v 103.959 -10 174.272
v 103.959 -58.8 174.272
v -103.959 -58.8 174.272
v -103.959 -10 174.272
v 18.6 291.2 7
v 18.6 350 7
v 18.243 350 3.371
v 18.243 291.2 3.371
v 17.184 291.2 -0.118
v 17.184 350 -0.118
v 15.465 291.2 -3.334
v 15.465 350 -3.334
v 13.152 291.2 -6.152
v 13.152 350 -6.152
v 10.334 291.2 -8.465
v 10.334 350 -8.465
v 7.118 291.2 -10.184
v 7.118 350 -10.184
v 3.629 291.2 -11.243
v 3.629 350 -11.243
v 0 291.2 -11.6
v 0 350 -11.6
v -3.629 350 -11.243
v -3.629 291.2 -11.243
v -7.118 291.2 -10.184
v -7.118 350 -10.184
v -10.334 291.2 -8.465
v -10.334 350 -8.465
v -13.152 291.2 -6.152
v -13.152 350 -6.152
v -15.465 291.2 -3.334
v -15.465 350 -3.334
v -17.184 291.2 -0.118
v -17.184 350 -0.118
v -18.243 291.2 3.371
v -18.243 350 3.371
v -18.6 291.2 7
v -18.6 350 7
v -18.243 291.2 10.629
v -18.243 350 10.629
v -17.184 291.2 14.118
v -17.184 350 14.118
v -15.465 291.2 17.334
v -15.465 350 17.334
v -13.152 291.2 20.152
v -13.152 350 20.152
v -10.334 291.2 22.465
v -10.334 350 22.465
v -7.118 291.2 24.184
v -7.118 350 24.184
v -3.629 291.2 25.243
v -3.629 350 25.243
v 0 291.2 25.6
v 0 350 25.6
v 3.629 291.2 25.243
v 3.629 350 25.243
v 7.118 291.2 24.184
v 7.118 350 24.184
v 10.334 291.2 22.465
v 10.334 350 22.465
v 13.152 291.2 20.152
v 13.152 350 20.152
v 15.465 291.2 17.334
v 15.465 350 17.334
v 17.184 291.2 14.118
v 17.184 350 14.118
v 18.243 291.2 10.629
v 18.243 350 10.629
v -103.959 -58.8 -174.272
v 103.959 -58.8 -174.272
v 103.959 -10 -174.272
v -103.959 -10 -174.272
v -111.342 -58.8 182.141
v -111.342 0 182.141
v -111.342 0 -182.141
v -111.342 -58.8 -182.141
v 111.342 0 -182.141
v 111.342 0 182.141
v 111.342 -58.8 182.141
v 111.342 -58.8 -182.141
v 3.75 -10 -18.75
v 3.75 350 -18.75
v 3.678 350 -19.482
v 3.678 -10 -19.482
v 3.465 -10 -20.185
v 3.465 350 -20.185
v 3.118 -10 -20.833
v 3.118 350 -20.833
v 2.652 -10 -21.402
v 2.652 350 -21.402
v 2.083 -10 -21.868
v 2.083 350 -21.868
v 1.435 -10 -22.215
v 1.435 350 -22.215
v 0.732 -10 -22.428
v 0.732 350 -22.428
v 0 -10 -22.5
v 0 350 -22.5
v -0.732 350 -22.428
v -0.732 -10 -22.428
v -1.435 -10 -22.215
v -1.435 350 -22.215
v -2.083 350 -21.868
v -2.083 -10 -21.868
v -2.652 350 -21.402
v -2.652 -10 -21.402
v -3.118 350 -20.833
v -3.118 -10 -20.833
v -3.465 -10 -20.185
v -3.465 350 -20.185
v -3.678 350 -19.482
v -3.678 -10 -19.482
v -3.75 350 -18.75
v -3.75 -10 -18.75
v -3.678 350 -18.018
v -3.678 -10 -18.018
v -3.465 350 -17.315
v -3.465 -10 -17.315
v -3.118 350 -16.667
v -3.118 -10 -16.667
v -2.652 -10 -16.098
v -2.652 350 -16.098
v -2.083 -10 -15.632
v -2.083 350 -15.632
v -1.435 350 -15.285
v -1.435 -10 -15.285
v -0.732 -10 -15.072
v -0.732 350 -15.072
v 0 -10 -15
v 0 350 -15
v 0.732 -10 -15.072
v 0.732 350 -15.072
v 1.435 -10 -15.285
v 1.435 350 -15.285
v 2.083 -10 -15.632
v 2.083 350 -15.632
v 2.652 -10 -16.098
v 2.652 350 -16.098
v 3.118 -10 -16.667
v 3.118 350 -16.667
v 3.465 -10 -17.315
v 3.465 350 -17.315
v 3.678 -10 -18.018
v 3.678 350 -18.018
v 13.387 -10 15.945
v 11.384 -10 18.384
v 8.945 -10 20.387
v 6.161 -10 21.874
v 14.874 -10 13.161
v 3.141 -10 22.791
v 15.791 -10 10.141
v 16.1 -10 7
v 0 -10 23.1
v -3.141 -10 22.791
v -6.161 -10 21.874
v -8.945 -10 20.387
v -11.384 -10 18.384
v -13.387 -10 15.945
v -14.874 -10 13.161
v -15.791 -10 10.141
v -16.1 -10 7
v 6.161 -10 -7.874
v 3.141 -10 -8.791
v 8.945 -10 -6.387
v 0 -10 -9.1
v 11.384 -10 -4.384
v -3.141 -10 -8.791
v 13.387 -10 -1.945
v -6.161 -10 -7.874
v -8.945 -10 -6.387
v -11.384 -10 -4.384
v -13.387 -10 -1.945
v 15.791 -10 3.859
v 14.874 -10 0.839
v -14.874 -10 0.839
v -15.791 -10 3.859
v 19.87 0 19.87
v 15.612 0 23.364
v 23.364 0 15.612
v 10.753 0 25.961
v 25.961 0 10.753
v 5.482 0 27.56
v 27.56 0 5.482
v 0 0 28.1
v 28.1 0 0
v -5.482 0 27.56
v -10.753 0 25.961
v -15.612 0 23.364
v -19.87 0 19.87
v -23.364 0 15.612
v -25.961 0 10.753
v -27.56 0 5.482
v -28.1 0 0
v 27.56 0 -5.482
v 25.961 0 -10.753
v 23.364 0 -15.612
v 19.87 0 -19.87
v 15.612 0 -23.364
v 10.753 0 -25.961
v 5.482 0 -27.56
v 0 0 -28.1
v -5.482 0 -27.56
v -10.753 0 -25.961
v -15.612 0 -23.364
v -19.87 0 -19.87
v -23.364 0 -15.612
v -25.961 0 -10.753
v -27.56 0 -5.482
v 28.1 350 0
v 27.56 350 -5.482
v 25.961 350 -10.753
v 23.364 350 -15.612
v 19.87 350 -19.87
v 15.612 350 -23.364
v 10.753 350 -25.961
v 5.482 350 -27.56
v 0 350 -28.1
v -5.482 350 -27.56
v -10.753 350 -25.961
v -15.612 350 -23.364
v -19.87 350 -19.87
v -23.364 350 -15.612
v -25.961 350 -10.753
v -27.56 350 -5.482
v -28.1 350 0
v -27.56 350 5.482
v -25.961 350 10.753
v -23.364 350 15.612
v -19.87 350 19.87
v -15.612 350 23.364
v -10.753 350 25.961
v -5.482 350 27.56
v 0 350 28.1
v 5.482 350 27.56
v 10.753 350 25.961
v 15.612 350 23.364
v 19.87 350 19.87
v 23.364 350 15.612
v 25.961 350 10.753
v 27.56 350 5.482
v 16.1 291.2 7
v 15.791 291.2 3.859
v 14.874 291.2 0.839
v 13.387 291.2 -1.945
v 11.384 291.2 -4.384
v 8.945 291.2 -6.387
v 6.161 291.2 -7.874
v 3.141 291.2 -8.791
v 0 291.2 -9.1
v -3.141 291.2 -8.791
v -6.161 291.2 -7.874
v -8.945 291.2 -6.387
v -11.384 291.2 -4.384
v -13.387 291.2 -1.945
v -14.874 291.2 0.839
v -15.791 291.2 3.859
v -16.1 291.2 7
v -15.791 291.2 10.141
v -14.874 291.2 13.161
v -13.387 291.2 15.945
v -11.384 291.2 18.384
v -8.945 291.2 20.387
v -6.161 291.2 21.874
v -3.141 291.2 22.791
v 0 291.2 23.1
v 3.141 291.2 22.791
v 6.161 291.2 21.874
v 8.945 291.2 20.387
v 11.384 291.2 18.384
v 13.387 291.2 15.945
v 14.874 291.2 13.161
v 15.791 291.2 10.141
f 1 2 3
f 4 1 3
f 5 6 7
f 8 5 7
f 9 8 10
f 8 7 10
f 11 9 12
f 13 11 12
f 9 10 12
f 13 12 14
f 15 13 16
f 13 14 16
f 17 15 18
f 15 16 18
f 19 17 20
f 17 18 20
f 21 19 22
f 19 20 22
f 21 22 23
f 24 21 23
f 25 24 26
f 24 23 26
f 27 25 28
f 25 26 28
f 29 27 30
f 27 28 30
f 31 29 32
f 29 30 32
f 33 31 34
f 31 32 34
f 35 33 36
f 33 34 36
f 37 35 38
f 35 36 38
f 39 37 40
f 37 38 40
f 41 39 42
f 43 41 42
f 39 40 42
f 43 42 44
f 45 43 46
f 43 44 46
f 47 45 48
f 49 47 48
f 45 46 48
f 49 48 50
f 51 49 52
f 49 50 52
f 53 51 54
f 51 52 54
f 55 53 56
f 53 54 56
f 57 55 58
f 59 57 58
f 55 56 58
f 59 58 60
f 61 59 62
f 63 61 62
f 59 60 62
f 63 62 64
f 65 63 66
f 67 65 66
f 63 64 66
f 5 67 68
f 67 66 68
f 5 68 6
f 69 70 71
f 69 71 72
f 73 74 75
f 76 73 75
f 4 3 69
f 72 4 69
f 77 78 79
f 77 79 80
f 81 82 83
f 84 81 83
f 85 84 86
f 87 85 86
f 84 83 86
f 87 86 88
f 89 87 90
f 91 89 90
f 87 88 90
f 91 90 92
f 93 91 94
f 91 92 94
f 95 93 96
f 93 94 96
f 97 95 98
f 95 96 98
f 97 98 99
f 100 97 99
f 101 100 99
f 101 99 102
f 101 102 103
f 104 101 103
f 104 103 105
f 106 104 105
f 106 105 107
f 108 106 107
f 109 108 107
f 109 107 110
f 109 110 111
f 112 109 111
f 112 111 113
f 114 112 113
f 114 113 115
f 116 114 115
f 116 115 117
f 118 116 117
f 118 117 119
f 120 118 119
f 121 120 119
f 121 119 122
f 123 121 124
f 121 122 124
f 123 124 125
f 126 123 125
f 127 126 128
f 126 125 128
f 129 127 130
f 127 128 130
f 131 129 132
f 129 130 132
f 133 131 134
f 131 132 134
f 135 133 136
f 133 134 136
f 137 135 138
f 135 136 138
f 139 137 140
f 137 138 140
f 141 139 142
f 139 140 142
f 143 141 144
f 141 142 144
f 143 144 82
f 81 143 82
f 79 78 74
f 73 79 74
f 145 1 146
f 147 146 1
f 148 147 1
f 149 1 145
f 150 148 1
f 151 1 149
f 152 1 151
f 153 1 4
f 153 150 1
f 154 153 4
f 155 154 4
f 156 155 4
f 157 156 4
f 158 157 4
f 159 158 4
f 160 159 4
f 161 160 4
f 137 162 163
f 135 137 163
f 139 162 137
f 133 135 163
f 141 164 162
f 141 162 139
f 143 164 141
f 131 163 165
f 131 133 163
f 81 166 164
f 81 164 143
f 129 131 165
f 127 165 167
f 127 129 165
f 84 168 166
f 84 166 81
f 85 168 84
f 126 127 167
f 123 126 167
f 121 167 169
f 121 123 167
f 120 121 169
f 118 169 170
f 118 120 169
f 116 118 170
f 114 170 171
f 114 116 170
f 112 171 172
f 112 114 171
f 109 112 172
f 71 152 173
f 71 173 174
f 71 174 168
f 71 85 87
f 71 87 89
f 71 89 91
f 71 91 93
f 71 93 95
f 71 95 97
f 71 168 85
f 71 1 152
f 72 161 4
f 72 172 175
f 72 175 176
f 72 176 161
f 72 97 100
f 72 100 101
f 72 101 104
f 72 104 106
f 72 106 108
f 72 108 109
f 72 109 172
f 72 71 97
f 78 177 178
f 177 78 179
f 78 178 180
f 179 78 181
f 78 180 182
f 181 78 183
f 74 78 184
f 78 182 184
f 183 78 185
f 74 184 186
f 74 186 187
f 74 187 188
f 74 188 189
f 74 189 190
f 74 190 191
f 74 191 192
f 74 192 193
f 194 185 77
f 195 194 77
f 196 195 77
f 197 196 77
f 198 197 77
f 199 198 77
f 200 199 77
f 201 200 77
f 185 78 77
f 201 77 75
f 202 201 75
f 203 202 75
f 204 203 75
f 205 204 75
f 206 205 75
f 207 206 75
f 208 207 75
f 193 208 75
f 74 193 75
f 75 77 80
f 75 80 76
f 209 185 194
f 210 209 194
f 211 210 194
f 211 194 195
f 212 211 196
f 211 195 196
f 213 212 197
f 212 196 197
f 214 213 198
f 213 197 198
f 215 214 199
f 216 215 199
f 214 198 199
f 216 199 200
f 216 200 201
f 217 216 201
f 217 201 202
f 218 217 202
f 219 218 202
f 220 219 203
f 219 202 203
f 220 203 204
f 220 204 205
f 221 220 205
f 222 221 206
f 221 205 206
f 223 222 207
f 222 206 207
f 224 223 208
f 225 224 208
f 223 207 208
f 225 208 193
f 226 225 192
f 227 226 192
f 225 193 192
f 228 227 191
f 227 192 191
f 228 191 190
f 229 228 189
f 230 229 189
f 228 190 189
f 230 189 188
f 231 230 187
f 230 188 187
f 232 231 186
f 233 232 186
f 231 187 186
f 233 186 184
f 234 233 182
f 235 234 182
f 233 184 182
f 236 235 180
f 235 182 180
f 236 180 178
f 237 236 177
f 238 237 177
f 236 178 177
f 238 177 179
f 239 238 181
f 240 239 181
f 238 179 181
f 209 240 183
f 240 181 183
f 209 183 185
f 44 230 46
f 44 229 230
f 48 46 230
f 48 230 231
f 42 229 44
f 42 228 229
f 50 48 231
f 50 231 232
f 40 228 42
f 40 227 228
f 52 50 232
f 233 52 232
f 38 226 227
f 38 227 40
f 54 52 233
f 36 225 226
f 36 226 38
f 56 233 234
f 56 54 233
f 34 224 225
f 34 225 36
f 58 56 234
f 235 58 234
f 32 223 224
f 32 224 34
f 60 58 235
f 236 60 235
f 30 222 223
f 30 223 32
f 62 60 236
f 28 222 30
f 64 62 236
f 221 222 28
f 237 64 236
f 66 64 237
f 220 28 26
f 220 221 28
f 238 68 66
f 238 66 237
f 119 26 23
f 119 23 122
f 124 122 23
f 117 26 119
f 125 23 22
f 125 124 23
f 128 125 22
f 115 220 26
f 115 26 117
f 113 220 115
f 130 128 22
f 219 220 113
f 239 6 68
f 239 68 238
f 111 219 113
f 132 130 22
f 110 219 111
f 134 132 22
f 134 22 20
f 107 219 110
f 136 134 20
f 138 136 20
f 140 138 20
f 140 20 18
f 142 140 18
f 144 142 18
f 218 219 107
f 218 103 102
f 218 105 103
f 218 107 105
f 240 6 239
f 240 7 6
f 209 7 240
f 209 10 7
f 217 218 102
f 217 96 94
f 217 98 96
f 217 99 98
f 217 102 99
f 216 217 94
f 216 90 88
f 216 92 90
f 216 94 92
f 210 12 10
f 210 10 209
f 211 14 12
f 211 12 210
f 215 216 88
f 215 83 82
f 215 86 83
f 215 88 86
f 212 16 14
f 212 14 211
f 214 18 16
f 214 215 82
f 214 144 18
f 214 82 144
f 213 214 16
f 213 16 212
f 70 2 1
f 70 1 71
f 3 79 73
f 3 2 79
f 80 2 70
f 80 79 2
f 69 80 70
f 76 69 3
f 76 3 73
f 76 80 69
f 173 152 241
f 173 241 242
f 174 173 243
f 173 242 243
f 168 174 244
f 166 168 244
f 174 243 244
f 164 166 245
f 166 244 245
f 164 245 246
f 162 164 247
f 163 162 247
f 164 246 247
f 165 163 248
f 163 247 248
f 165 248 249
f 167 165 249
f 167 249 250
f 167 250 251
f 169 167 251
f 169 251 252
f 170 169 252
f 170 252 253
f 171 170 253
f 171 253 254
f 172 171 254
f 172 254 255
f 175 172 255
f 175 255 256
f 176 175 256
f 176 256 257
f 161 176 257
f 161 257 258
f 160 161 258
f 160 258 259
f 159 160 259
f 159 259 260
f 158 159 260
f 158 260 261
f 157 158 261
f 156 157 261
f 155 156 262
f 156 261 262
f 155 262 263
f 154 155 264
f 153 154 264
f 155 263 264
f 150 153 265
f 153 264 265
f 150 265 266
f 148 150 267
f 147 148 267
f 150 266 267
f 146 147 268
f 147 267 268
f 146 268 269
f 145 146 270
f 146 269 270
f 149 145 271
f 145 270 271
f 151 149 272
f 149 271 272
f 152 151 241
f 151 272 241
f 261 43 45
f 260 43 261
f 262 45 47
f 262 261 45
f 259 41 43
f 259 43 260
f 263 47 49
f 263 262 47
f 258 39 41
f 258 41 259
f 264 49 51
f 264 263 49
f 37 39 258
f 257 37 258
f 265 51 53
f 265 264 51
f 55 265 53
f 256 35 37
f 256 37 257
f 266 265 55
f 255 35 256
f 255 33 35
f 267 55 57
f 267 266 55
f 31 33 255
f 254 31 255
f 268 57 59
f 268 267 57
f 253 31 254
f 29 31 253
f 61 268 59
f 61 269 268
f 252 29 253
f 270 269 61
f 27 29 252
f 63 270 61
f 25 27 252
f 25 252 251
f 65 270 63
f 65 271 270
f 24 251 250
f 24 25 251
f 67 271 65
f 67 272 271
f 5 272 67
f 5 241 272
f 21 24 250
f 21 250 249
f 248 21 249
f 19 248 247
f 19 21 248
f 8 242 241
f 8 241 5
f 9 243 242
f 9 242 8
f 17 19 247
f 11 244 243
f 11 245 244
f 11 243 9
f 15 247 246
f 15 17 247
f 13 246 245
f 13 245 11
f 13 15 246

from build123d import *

# Parameters (mm, degrees)
SKETCH1_R           = 28.1
BOSS_EXTRUDE1_DEPTH = 350
SKETCH2_R           = 18.6
CUT_EXTRUDE1_DEPTH  = 58.8
SKETCH3_W           = 222.683092022
SKETCH3_H           = 364.2827524
BOSS_EXTRUDE2_DEPTH = 58.8
SKETCH4_W           = 207.917403516
SKETCH4_H           = 348.54429772
CUT_EXTRUDE2_DEPTH  = 48.8
SKETCH5_R           = 16.1
CUT_EXTRUDE3_DEPTH  = 350
SKETCH6_R           = 3.75
CUT_EXTRUDE5_DEPTH  = 400


with BuildPart() as part:
    # Sketch1 → Boss-Extrude1 (new body)
    with BuildSketch(Plane(origin=(0, 0, 0), x_dir=(1, 0, 0), z_dir=(0, 1, 0))):
        Circle(SKETCH1_R)
    extrude(amount=BOSS_EXTRUDE1_DEPTH)

    # Sketch2 → Cut-Extrude1 (cut)
    with BuildSketch(Plane(origin=(0, 350, 0), x_dir=(1, 0, 0), z_dir=(0, 1, 0))):
        with Locations((0, -7)):
            Circle(SKETCH2_R)
    extrude(amount=-CUT_EXTRUDE1_DEPTH, mode=Mode.SUBTRACT)

    # Sketch3 → Boss-Extrude2 (add)
    with BuildSketch(Plane(origin=(0, 0, 0), x_dir=(-1, 0, 0), z_dir=(0, -1, 0))):
        Rectangle(SKETCH3_W, SKETCH3_H)
    extrude(amount=BOSS_EXTRUDE2_DEPTH)

    # Sketch4 → Cut-Extrude2 (cut)
    with BuildSketch(Plane(origin=(0, -58.8, 0), x_dir=(-1, 0, 0), z_dir=(0, -1, 0))):
        Rectangle(SKETCH4_W, SKETCH4_H)
    extrude(amount=-CUT_EXTRUDE2_DEPTH, mode=Mode.SUBTRACT)

    # Sketch5 → Cut-Extrude3 (cut)
    with BuildSketch(Plane(origin=(0, 291.2, 0), x_dir=(1, 0, 0), z_dir=(0, 1, 0))):
        with Locations((0, -7)):
            Circle(SKETCH5_R)
    extrude(amount=-CUT_EXTRUDE3_DEPTH, mode=Mode.SUBTRACT)

    # Sketch6 → Cut-Extrude5 (cut)
    with BuildSketch(Plane(origin=(0, 350, 0), x_dir=(1, 0, 0), z_dir=(0, 1, 0))):
        with Locations((0, 18.75)):
            Circle(SKETCH6_R)
    extrude(amount=-CUT_EXTRUDE5_DEPTH, mode=Mode.SUBTRACT)


solid = part.part
